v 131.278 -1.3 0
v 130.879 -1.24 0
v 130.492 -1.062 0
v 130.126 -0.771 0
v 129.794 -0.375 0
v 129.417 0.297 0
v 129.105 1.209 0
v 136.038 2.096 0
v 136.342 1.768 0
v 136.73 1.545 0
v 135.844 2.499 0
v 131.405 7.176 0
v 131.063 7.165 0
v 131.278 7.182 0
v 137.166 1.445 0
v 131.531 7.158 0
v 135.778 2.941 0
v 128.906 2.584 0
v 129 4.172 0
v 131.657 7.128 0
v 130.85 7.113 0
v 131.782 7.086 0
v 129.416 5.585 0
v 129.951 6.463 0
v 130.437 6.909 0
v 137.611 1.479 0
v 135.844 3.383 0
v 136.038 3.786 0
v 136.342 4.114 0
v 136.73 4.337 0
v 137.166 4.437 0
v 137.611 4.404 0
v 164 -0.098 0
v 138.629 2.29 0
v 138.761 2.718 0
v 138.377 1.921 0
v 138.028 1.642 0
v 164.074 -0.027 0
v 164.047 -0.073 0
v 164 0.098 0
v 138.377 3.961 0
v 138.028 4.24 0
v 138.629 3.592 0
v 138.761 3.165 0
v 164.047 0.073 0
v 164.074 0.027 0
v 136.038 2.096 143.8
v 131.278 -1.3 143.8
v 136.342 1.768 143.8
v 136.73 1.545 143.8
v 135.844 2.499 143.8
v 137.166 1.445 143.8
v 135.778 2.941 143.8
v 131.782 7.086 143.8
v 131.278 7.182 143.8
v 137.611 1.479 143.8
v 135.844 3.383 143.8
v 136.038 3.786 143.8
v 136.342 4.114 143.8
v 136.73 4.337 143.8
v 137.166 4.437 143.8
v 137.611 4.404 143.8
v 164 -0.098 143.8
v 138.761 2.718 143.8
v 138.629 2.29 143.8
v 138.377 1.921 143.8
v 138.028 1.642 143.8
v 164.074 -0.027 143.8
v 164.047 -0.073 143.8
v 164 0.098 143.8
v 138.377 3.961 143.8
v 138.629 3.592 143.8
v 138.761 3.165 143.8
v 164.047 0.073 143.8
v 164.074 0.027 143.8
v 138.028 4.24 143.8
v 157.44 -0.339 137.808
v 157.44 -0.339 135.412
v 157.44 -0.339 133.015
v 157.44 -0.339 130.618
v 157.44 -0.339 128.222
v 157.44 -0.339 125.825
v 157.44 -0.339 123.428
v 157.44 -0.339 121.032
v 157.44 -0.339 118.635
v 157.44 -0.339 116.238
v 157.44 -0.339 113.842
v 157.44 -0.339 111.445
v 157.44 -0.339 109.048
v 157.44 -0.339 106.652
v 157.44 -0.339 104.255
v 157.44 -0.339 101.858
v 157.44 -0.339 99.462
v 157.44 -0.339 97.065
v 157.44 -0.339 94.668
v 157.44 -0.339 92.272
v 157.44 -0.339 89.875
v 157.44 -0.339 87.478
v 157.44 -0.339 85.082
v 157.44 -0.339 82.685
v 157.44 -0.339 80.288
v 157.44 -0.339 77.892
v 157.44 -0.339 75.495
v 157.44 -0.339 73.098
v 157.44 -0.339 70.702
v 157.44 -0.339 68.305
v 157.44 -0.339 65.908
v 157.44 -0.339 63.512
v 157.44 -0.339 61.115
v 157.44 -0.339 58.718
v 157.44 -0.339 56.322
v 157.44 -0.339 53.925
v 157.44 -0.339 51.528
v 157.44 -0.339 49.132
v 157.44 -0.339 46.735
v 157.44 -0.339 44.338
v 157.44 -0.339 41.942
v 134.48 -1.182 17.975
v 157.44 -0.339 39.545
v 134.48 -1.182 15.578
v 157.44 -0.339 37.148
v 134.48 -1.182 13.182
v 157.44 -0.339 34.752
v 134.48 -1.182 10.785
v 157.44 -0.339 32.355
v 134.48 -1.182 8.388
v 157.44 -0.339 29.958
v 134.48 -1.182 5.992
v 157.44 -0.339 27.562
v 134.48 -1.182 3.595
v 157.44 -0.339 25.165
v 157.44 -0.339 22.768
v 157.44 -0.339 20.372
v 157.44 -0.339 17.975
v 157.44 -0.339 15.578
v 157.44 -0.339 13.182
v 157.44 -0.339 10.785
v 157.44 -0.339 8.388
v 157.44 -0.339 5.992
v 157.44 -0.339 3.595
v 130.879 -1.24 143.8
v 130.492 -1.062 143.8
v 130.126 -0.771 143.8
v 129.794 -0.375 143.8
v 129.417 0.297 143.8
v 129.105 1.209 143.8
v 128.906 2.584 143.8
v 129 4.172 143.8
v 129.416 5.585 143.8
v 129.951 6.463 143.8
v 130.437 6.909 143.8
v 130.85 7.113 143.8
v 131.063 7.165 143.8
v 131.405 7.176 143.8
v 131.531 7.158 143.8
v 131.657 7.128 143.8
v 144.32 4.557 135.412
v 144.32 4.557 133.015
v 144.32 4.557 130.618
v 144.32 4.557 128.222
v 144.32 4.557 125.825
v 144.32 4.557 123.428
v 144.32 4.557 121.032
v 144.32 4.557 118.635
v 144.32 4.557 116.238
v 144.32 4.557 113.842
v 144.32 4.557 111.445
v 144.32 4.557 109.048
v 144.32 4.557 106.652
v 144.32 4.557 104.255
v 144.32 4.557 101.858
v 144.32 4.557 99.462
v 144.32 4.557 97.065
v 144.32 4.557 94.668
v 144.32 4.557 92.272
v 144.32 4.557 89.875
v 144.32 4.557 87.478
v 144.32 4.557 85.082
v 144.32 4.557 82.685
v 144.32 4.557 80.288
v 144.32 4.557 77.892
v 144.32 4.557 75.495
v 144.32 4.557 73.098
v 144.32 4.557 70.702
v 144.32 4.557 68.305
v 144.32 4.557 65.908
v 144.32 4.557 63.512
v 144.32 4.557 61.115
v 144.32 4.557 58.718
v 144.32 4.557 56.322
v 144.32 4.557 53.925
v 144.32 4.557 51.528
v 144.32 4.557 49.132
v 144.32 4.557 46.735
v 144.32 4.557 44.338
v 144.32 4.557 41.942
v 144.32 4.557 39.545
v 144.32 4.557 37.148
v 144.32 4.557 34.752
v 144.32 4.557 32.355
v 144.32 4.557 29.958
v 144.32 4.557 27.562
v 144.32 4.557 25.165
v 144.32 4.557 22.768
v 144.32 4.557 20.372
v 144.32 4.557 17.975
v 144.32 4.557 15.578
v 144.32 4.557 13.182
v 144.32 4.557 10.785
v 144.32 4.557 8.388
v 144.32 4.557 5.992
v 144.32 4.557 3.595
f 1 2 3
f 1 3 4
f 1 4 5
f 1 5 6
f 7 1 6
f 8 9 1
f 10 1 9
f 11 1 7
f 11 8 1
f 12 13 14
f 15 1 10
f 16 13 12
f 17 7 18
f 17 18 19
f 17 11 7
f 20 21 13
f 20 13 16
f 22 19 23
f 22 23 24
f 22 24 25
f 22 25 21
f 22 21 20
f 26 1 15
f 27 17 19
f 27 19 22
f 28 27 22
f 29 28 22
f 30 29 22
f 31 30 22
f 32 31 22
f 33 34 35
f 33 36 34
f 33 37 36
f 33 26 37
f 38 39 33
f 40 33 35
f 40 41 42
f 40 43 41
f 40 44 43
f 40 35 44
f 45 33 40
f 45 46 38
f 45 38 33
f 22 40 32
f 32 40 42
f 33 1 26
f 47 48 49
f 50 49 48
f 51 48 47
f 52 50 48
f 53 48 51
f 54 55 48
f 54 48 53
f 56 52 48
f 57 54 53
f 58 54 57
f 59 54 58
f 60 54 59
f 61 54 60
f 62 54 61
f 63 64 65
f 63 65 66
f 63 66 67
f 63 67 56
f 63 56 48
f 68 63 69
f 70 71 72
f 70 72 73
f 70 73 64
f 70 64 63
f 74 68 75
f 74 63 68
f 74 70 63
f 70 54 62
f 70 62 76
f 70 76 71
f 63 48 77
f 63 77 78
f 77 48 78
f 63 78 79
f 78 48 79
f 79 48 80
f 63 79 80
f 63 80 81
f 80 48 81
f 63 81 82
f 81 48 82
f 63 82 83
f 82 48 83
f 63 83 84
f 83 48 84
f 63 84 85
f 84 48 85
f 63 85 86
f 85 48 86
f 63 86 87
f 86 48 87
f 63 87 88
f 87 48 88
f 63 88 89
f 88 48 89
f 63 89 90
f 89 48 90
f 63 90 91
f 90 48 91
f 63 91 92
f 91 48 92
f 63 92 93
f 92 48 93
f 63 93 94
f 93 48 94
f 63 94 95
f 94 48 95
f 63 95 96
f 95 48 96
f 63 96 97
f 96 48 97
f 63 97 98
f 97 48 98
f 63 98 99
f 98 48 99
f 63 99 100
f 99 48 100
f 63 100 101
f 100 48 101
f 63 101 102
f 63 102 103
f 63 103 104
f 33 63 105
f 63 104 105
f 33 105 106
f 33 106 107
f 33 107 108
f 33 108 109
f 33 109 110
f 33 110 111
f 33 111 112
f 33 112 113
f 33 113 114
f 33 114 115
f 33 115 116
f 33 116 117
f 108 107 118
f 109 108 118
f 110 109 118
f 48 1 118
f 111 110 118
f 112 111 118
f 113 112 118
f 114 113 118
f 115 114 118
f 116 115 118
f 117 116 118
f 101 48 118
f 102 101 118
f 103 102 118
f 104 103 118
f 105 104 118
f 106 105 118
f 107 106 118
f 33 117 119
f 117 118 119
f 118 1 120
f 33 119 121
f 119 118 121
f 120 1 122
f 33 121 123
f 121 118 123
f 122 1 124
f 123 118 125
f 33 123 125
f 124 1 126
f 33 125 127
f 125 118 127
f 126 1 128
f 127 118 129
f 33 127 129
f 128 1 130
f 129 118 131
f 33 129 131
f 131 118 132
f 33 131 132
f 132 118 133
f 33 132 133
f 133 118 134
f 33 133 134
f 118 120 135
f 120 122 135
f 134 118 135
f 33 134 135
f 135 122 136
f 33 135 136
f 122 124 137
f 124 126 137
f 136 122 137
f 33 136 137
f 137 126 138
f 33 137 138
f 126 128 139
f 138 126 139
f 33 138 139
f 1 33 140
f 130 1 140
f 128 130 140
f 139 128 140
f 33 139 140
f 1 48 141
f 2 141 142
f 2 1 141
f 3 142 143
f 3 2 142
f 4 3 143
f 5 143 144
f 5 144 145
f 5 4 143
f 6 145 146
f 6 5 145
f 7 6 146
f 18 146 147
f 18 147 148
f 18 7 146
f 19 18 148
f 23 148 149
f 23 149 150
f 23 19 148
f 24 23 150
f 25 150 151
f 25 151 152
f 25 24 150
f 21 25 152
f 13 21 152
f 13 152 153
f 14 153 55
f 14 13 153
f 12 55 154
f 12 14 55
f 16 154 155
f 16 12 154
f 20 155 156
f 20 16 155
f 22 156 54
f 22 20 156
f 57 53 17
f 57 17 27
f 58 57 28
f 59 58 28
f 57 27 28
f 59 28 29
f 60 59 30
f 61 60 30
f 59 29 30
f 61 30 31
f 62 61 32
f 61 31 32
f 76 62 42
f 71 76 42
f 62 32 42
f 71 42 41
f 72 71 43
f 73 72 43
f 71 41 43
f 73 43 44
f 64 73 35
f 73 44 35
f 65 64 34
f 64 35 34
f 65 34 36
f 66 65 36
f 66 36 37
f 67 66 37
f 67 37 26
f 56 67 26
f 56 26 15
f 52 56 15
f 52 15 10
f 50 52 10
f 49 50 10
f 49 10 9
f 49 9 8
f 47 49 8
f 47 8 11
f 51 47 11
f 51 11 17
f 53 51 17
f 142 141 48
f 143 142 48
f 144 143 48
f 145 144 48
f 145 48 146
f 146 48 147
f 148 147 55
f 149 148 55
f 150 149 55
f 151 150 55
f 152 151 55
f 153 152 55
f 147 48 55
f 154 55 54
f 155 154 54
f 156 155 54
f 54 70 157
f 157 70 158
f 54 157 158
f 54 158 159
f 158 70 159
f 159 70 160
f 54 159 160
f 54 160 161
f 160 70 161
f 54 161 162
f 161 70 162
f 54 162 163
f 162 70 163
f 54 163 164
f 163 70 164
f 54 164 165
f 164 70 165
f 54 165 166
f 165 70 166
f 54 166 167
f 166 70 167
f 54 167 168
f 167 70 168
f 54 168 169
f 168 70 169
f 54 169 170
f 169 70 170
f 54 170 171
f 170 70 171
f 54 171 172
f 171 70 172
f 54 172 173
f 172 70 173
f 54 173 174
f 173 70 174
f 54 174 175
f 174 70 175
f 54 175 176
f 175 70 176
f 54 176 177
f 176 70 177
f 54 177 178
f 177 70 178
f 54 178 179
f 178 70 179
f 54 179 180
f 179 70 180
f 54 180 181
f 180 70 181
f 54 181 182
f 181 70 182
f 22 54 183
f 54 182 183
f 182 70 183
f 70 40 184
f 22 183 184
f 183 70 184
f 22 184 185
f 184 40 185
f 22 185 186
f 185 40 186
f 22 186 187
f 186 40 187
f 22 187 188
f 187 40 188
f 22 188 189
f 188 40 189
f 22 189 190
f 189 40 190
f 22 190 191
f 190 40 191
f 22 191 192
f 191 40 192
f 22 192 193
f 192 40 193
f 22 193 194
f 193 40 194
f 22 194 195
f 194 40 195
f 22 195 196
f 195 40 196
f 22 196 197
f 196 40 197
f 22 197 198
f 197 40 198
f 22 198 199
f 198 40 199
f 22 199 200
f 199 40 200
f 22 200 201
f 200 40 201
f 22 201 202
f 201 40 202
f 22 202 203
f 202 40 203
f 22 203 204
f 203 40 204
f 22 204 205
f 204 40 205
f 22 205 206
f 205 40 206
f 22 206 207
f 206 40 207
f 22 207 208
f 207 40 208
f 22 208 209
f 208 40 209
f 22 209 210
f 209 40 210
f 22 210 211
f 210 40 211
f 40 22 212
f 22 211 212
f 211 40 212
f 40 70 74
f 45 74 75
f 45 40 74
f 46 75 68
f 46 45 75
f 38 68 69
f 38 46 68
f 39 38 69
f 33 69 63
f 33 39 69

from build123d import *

# Parameters (mm, degrees)
BOSS_EXTRUDE1_DEPTH        = 1246.6
SKETCH3_W                  = 131.331771
SKETCH3_H                  = 32.627886
AILERON_CHORD_DEPTH        = 1246.6
AILERON_SPAN_DEPTH         = 10
AILERON_SPAN_DEPTH_BACK    = 10
SKETCH4_W                  = 171.070003
SKETCH4_H                  = 1110.639097
SKETCH5_R                  = 1.5
AILERON_SPAR_HOLE_DEPTH    = 219.292246
SKETCH6_RX                 = 4.241084
SKETCH6_RY                 = 2.380428
AILERON_LEADING_EDGE_DEPTH = 143.8


with BuildPart() as part:
    # Sketch2 → Boss-Extrude1 (new body)
    with BuildSketch(Plane.XY):
        with BuildLine():
            ThreePointArc((164, 0.098236), (164.077667, 0), (164, -0.098236))
            add(Edge.make_bspline(
                [(164, 0.098236), (163.453347, 0.227855), (162.360116, 0.487077), (160.720174, 0.874803), (159.080335, 1.261114), (156.894332, 1.771897), (154.161962, 2.401008), (150.881841, 3.137526), (147.601665, 3.856594), (144.321702, 4.559852), (141.041699, 5.246218), (137.761757, 5.915572), (134.481686, 6.566534), (131.201761, 7.199898), (127.921668, 7.813754), (124.641701, 8.409172), (121.361598, 8.98465), (118.081601, 9.541284), (114.801561, 10.078059), (111.521601, 10.595035), (108.241714, 11.090965), (104.961715, 11.562926), (101.681786, 12.010167), (98.401747, 12.429709), (95.121663, 12.8205), (91.841542, 13.181831), (88.561414, 13.51363), (85.281283, 13.815894), (82.001169, 14.088695), (78.721095, 14.331741), (75.441021, 14.543175), (72.160895, 14.719913), (68.880726, 14.859428), (65.600503, 14.959161), (62.320225, 15.016118), (59.03999, 15.033011), (55.759815, 15.012804), (52.479681, 14.959634), (49.199602, 14.875645), (45.919233, 14.766825), (42.638538, 14.618827), (39.357416, 14.416023), (36.075798, 14.141603), (32.793534, 13.779736), (29.511749, 13.311849), (26.230435, 12.736941), (22.948211, 12.059087), (19.663974, 11.271431), (16.378115, 10.351738), (13.092739, 9.27165), (10.358156, 8.239856), (8.178743, 7.269153), (6.527119, 6.423629), (4.860633, 5.419015), (3.322168, 4.246728), (2.16678, 3.134219), (1.284844, 2.240038), (0.724778, 1.586326), (0.356487, 1.023715), (0.176339, 0.655159), (0.061261, 0.337633), (-0.042912, -0.12114), (0.010077, -0.598533), (0.176199, -1.014078), (0.354673, -1.344525), (0.71711, -1.82624), (1.269773, -2.336775), (2.131754, -2.920204), (3.354944, -3.392789), (4.915318, -3.707167), (6.554156, -4.03305), (8.195339, -4.283516), (10.38227, -4.5154), (13.118625, -4.672653), (16.398858, -4.828476), (19.679494, -4.922127), (22.959844, -4.966534), (26.240095, -4.967885), (29.520218, -4.932841), (32.800258, -4.868949), (36.080251, -4.782672), (39.360206, -4.679002), (42.64013, -4.562992), (45.920051, -4.439945), (49.199963, -4.314096), (52.479955, -4.190749), (55.759981, -4.070022), (59.039983, -3.95008), (62.320004, -3.83127), (65.600009, -3.712064), (68.880009, -3.592327), (72.16001, -3.47216), (75.439998, -3.351295), (78.720004, -3.230701), (81.999996, -3.109715), (85.279997, -2.989046), (88.559997, -2.868485), (91.84, -2.748159), (95.12, -2.627768), (98.4, -2.5074), (101.68, -2.387008), (104.960004, -2.266687), (108.24, -2.146109), (111.519996, -2.025503), (114.800005, -1.905264), (118.079995, -1.784568), (121.360005, -1.664353), (124.639995, -1.54365), (127.920005, -1.423438), (131.199995, -1.302734), (134.480005, -1.182522), (137.759995, -1.061818), (141.040005, -0.941606), (144.319995, -0.820902), (147.600005, -0.70069), (150.879995, -0.579986), (154.160005, -0.459776), (156.89333, -0.359182), (159.08, -0.278973), (160.72, -0.218763), (162.360004, -0.158632), (163.453334, -0.118368), (164, -0.098236)],
                knots=[0, 0, 0, 0, 0.005028, 0.010055, 0.015081, 0.020105, 0.030145, 0.040174, 0.050191, 0.060198, 0.070194, 0.08018, 0.090156, 0.100121, 0.110076, 0.12002, 0.129954, 0.139879, 0.149793, 0.159699, 0.169594, 0.17948, 0.189355, 0.199219, 0.209073, 0.218917, 0.228751, 0.238577, 0.248396, 0.258207, 0.268012, 0.277811, 0.287604, 0.297393, 0.307179, 0.316964, 0.326749, 0.336535, 0.346322, 0.356113, 0.365908, 0.375711, 0.385531, 0.395376, 0.405259, 0.415192, 0.425184, 0.435248, 0.445412, 0.455711, 0.466191, 0.471552, 0.477055, 0.482787, 0.488946, 0.494316, 0.497126, 0.500187, 0.502001, 0.503128, 0.50385, 0.50502, 0.507318, 0.507987, 0.509024, 0.510668, 0.513358, 0.515716, 0.519949, 0.524973, 0.529954, 0.534903, 0.539824, 0.54963, 0.559425, 0.569214, 0.579, 0.588784, 0.59857, 0.608356, 0.618144, 0.627933, 0.637724, 0.647515, 0.657307, 0.667099, 0.67689, 0.686681, 0.696472, 0.706263, 0.716054, 0.725846, 0.735637, 0.745428, 0.755219, 0.765011, 0.774802, 0.784593, 0.794384, 0.804176, 0.813967, 0.823758, 0.833549, 0.84334, 0.853132, 0.862923, 0.872714, 0.882505, 0.892297, 0.902088, 0.911879, 0.92167, 0.931461, 0.941253, 0.951044, 0.960835, 0.970626, 0.980418, 0.985313, 0.990209, 0.995104, 1, 1, 1, 1], degree=3))
        make_face()
    extrude(amount=BOSS_EXTRUDE1_DEPTH)

    # Sketch3 → Aileron chord (cut)
    with BuildSketch(Plane.XY.offset(1246.6)):
        with Locations((65.611782, 9.808584)):
            Rectangle(SKETCH3_W, SKETCH3_H)
    extrude(amount=-AILERON_CHORD_DEPTH, mode=Mode.SUBTRACT)

    # Sketch4 → Aileron span (cut, two sides: drawn at the far end of the back side and taken through both)
    with BuildSketch(Plane(origin=(0, 0, 0), x_dir=(1, 0, 0), z_dir=(0, 1, 0)).offset(-AILERON_SPAN_DEPTH_BACK)):
        with Locations((146.361743, -699.119548)):
            Rectangle(SKETCH4_W, SKETCH4_H)
    extrude(amount=AILERON_SPAN_DEPTH + AILERON_SPAN_DEPTH_BACK, mode=Mode.SUBTRACT)

    # Sketch5 → Aileron spar hole (cut, through all)
    with BuildSketch(Plane(origin=(0, 0, 0), x_dir=(-1, 0, 0), z_dir=(0, 0, -1))):
        with Locations((-137.277667, 2.94112)):
            Circle(SKETCH5_R)
    extrude(amount=-AILERON_SPAR_HOLE_DEPTH, mode=Mode.SUBTRACT)

    # Sketch6 → Aileron leading edge (add)
    with BuildSketch(Plane(origin=(0, 0, 0), x_dir=(-1, 0, 0), z_dir=(0, 0, -1))):
        with Locations(Location((-131.277667, 2.94112), (0, 0, 90))):
            Ellipse(SKETCH6_RX, SKETCH6_RY)
    extrude(amount=-AILERON_LEADING_EDGE_DEPTH)


solid = part.part
